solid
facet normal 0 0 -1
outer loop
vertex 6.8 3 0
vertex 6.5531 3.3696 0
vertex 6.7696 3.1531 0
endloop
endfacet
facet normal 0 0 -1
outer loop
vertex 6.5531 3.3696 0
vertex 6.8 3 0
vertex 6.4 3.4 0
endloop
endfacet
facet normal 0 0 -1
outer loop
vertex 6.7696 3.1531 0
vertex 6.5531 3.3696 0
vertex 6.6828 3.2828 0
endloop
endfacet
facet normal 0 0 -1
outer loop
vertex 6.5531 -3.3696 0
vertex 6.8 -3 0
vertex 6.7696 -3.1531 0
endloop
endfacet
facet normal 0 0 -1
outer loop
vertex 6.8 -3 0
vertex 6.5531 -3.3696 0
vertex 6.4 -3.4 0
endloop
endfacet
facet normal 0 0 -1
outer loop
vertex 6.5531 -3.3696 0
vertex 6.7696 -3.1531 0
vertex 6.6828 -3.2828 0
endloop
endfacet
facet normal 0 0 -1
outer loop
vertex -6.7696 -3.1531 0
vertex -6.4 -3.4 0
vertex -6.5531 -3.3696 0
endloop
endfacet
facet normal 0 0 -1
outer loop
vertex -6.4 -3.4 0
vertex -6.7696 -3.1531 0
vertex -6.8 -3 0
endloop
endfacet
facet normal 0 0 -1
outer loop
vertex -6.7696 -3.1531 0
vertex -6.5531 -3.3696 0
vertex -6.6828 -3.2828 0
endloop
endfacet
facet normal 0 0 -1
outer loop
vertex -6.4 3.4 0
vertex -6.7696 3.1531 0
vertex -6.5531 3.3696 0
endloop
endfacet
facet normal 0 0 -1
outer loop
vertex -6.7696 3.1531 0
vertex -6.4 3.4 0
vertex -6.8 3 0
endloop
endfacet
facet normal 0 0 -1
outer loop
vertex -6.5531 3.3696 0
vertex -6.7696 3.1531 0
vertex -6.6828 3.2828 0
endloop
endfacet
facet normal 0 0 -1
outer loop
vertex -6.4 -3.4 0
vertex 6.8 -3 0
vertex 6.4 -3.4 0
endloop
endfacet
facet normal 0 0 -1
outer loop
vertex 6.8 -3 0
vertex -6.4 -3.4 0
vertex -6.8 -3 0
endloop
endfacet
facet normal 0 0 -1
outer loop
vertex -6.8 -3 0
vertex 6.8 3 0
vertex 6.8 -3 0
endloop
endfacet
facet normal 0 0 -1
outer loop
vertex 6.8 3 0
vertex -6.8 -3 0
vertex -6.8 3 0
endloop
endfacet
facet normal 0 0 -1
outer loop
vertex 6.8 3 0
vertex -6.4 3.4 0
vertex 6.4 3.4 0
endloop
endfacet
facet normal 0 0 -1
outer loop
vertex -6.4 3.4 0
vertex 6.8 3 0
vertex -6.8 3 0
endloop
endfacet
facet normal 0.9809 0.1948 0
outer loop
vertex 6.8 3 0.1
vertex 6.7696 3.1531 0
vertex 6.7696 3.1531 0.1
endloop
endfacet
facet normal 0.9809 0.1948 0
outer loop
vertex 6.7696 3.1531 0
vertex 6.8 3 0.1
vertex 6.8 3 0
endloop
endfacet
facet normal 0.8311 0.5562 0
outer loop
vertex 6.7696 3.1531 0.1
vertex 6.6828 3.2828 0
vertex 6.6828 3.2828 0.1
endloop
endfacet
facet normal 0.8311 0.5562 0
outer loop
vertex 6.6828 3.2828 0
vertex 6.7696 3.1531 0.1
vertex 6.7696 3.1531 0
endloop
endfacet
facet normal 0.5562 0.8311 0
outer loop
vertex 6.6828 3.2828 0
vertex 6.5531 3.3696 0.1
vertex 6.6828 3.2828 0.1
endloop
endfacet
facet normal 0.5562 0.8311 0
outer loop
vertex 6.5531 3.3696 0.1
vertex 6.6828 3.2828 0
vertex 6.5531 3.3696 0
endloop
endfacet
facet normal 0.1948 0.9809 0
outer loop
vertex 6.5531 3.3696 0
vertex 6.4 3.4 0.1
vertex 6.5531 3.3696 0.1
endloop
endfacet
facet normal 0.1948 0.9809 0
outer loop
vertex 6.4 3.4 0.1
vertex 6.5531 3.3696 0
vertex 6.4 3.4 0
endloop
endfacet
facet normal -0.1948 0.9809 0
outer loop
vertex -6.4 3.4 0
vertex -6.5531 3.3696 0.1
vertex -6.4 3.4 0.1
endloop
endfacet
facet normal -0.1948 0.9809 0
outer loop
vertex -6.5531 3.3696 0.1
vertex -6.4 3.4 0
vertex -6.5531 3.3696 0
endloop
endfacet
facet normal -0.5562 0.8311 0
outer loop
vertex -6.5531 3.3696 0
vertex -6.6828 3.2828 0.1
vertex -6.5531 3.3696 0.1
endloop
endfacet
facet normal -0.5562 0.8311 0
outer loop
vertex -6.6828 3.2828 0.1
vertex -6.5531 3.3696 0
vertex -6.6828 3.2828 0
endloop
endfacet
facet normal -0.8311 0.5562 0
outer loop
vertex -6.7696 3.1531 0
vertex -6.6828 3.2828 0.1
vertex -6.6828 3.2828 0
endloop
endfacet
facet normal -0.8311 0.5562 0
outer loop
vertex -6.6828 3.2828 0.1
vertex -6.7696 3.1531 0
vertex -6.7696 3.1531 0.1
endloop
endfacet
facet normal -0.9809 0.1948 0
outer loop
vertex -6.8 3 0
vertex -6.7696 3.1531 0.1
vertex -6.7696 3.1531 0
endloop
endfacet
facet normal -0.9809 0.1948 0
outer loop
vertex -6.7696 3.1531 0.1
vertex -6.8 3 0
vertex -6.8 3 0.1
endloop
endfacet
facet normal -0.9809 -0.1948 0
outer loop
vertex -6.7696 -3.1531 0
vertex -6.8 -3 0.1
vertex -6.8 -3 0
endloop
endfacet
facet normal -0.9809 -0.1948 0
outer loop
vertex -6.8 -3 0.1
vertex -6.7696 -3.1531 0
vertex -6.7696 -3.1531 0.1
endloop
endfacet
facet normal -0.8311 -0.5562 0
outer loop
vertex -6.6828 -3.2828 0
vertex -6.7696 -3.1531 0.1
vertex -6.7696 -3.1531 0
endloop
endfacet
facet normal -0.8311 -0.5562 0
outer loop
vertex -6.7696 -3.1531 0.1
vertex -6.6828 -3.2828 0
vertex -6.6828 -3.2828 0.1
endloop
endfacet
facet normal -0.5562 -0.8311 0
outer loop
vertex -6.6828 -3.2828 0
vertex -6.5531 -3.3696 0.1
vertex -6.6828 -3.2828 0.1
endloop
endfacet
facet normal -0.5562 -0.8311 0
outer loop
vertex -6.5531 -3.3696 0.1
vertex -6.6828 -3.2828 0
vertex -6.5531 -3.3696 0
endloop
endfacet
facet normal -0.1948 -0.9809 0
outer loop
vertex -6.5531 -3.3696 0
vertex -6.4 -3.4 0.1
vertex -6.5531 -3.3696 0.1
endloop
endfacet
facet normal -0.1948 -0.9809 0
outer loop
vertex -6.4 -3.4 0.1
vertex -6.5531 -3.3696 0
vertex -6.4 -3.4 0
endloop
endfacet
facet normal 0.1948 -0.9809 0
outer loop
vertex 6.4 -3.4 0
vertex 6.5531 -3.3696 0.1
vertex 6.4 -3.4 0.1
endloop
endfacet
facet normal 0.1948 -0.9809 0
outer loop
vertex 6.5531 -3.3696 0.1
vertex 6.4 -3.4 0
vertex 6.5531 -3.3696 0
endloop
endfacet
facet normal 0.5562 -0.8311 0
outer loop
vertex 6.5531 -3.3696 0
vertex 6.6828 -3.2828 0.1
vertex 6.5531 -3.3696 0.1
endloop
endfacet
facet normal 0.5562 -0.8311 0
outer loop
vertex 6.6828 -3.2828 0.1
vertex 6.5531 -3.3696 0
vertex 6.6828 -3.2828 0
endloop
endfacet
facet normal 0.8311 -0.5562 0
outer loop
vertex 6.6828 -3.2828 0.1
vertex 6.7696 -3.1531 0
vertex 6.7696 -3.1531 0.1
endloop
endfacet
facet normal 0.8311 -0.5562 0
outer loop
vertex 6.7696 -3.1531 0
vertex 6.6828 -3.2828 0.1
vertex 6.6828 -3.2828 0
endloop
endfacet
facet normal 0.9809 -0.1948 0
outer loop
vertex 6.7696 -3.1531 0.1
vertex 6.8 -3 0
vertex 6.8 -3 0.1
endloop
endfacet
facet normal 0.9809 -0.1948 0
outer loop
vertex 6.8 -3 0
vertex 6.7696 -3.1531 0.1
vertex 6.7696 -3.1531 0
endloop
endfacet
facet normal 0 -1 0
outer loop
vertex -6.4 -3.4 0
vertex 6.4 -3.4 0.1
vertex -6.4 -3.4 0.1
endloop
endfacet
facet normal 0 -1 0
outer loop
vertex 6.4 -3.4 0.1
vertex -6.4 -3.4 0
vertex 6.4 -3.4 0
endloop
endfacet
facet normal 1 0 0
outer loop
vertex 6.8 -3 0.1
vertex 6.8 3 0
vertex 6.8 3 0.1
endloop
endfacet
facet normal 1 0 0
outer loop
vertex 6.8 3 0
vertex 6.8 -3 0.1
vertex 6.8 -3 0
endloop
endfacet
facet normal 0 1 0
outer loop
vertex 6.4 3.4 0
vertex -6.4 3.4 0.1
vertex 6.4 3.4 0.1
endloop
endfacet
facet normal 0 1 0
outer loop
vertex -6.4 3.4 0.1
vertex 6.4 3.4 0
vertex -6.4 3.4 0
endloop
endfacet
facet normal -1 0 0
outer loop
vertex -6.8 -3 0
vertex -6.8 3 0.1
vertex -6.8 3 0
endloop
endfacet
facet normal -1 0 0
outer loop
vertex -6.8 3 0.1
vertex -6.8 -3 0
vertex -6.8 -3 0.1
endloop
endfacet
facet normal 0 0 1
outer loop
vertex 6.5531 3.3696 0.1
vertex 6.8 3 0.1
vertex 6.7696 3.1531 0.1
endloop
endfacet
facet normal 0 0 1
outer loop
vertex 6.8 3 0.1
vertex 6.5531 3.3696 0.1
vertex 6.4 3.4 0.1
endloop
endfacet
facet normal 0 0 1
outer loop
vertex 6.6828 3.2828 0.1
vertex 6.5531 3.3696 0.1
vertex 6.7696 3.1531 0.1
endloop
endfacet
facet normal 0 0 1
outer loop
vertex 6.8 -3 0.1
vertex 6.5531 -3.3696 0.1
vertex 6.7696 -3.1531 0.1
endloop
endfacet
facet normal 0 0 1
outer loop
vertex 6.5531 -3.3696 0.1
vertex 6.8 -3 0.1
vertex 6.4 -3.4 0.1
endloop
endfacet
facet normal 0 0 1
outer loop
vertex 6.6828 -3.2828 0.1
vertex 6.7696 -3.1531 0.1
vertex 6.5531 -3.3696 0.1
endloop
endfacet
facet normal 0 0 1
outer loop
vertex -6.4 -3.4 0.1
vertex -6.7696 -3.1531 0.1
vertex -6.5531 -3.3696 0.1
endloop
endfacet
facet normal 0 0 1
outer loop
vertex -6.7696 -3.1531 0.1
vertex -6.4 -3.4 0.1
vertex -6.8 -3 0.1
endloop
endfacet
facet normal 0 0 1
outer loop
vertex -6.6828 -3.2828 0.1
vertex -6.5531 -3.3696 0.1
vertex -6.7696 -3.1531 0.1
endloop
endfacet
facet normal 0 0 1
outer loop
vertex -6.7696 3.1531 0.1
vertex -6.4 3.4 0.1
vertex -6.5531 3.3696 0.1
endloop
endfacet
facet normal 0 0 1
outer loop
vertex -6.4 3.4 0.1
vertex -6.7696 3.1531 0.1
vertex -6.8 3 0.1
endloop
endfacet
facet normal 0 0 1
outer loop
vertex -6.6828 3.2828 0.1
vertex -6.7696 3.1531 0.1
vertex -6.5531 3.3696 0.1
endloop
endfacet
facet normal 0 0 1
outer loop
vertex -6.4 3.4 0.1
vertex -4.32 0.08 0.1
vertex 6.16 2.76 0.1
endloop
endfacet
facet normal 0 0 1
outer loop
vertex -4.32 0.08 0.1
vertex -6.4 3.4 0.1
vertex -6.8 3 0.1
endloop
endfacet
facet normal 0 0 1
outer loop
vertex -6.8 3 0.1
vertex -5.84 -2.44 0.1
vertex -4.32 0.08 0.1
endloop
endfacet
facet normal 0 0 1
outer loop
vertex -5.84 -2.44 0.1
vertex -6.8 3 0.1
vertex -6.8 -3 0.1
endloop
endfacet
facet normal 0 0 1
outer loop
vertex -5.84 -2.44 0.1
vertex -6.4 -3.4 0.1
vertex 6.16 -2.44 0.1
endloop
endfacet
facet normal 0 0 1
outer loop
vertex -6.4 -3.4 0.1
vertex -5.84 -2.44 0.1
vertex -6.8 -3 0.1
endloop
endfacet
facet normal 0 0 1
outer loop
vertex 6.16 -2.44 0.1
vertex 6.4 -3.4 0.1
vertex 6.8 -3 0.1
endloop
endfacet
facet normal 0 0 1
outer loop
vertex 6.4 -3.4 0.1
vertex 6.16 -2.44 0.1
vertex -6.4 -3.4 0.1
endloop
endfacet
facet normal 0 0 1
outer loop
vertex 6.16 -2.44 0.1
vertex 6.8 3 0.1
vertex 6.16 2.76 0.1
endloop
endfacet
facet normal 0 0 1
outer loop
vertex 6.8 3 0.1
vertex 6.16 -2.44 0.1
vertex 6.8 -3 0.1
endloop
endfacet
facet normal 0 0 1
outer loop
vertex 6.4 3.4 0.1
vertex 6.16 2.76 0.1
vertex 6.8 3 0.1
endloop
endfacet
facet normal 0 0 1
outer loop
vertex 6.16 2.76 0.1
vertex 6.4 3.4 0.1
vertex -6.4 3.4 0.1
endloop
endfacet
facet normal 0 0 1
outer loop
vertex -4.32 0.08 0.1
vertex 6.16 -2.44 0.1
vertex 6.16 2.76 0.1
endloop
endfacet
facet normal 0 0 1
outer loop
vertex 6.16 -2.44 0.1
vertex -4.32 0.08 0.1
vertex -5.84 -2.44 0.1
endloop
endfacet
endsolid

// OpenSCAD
// file: ../p/1-4cyli.scad
use <../lib.scad>
function ldraw_lib__1_4cyli() = [
// 0 Cylinder 0.25
// 0 Name: 1-4cyli.dat
// 0 Author: James Jessiman
// 0 !LDRAW_ORG Primitive UPDATE 2012-01
// 0 !LICENSE Licensed under CC BY 4.0 : see CAreadme.txt
// 
// 0 BFC CERTIFY CCW
  [0,"BFC","CERTIFY"],
  [0,"BFC","CCW"],
// 
// 0 !HISTORY 2002-03-23 [sbliss] Added BFC statement.
// 0 !HISTORY 2002-04-25 [PTadmin] Official Update 2002-02
// 0 !HISTORY 2007-06-22 [PTadmin] Header formatted for Contributor Agreement
// 0 !HISTORY 2008-07-01 [PTadmin] Official Update 2008-01
// 0 !HISTORY 2012-02-16 [Philo] Changed to CCW
// 0 !HISTORY 2012-03-30 [PTadmin] Official Update 2012-01
// 
// 
// 4 16 1 1 0 0.9239 1 0.3827 0.9239 0 0.3827 1 0 0
  [4,16,1,1,0,0.9239,1,0.3827,0.9239,0,0.3827,1,0,0],
// 5 24 1 0 0 1 1 0 0.9239 0 0.3827 1 0 -1
  [5,24,1,0,0,1,1,0,0.9239,0,0.3827,1,0,-1],
// 4 16 0.9239 1 0.3827 0.7071 1 0.7071 0.7071 0 0.7071 0.9239 0 0.3827
  [4,16,0.9239,1,0.3827,0.7071,1,0.7071,0.7071,0,0.7071,0.9239,0,0.3827],
// 5 24 0.9239 0 0.3827 0.9239 1 0.3827 0.7071 0 0.7071 1 0 0
  [5,24,0.9239,0,0.3827,0.9239,1,0.3827,0.7071,0,0.7071,1,0,0],
// 4 16 0.7071 1 0.7071 0.3827 1 0.9239 0.3827 0 0.9239 0.7071 0 0.7071
  [4,16,0.7071,1,0.7071,0.3827,1,0.9239,0.3827,0,0.9239,0.7071,0,0.7071],
// 5 24 0.7071 0 0.7071 0.7071 1 0.7071 0.3827 0 0.9239 0.9239 0 0.3827
  [5,24,0.7071,0,0.7071,0.7071,1,0.7071,0.3827,0,0.9239,0.9239,0,0.3827],
// 4 16 0.3827 1 0.9239 0 1 1 0 0 1 0.3827 0 0.9239
  [4,16,0.3827,1,0.9239,0,1,1,0,0,1,0.3827,0,0.9239],
// 5 24 0.3827 0 0.9239 0.3827 1 0.9239 0 0 1 0.7071 0 0.7071
  [5,24,0.3827,0,0.9239,0.3827,1,0.9239,0,0,1,0.7071,0,0.7071],
// 5 24 0 0 1 0 1 1 0.3827 0 0.9239 -1 0 1
  [5,24,0,0,1,0,1,1,0.3827,0,0.9239,-1,0,1],
];
module ldraw_lib__1_4cyli(step=0, col=false, unit=2/5, alt=false, line=0.2, solid=!$preview)
    makepoly(ldraw_lib__1_4cyli(), step=step, col=col, unit=unit, alt=alt, line=line, solid=solid);
ldraw_lib__1_4cyli(line=0.2);
// file: ../p/1-4chrd.scad
use <../lib.scad>
function ldraw_lib__1_4chrd() = [
// 0 Chord 0.25
// 0 Name: 1-4chrd.dat
// 0 Author: Max Martin Richter [MMR1988]
// 0 !LDRAW_ORG Primitive UPDATE 2023-05
// 0 !LICENSE Licensed under CC BY 4.0 : see CAreadme.txt
// 
// 0 BFC CERTIFY CCW
  [0,"BFC","CERTIFY"],
  [0,"BFC","CCW"],
// 
// 0 !HISTORY 2004-04-22 [PTadmin] Official Update 2004-02
// 0 !HISTORY 2007-10-09 [PTadmin] Header formatted for Contributor Agreement
// 0 !HISTORY 2008-07-01 [PTadmin] Official Update 2008-01
// 0 !HISTORY 2012-08-02 [MMR1988] Re-creation with PrimGen2 and Rectifier
// 0 !HISTORY 2012-08-09 [PTadmin] Official Update 2012-02
// 0 !HISTORY 2023-10-27 [OrionP] Change author to MMR1988 from hafhead
// 0 !HISTORY 2023-10-31 [OrionP] Official Update 2023-05
// 
// 4 16 0.9239 0 0.3827 0.3827 0 0.9239 0 0 1 1 0 0
  [4,16,0.9239,0,0.3827,0.3827,0,0.9239,0,0,1,1,0,0],
// 3 16 0.7071 0 0.7071 0.3827 0 0.9239 0.9239 0 0.3827
  [3,16,0.7071,0,0.7071,0.3827,0,0.9239,0.9239,0,0.3827],
];
module ldraw_lib__1_4chrd(step=0, col=false, unit=2/5, alt=false, line=0.2, solid=!$preview)
    makepoly(ldraw_lib__1_4chrd(), step=step, col=col, unit=unit, alt=alt, line=line, solid=solid);
ldraw_lib__1_4chrd(line=0.2);
// main file
use <../lib.scad>
use <../p/1-4chrd.scad>
use <../p/1-4cyli.scad>
function ldraw_lib__6347356i() = [
// 0 Sticker  0.8 x  1.7 with Bright Light Orange Trapezoid Long Left
// 0 Name: 6347356i.dat
// 0 Author: Evert-Jan Boer [ejboer]
// 0 !LDRAW_ORG Part UPDATE 2024-06
// 0 !LICENSE Licensed under CC BY 4.0 : see CAreadme.txt
// 
// 0 BFC CERTIFY CCW
  [0,"BFC","CERTIFY"],
  [0,"BFC","CCW"],
// 
// 0 !KEYWORDS Republic Gunship, Set 75309, Star Wars
// 
// 0 !HISTORY 2024-07-29 [OrionP] Official Update 2024-06
// 
// 1 16 16 0 7.5 1 0 0 0 -1 0 0 0 1 1-4chrd.dat
  [1,16,16,0,7.5,1,0,0,0,-1,0,0,0,1, ldraw_lib__1_4chrd()],
// 1 16 16 0 -7.5 0 0 1 0 -1 0 -1 0 0 1-4chrd.dat
  [1,16,16,0,-7.5,0,0,1,0,-1,0,-1,0,0, ldraw_lib__1_4chrd()],
// 1 16 -16 0 -7.5 -1 0 0 0 -1 0 0 0 -1 1-4chrd.dat
  [1,16,-16,0,-7.5,-1,0,0,0,-1,0,0,0,-1, ldraw_lib__1_4chrd()],
// 1 16 -16 0 7.5 0 0 -1 0 -1 0 1 0 0 1-4chrd.dat
  [1,16,-16,0,7.5,0,0,-1,0,-1,0,1,0,0, ldraw_lib__1_4chrd()],
// 4 16 16 0 -8.5 -16 0 -8.5 -17 0 -7.5 17 0 -7.5
  [4,16,16,0,-8.5,-16,0,-8.5,-17,0,-7.5,17,0,-7.5],
// 4 16 17 0 7.5 17 0 -7.5 -17 0 -7.5 -17 0 7.5
  [4,16,17,0,7.5,17,0,-7.5,-17,0,-7.5,-17,0,7.5],
// 4 16 17 0 7.5 -17 0 7.5 -16 0 8.5 16 0 8.5
  [4,16,17,0,7.5,-17,0,7.5,-16,0,8.5,16,0,8.5],
// 
// 1 16 16 -.25 7.5 1 0 0 0 .25 0 0 0 1 1-4cyli.dat
  [1,16,16,-.25,7.5,1,0,0,0,.25,0,0,0,1, ldraw_lib__1_4cyli()],
// 1 16 -16 -.25 7.5 0 0 -1 0 .25 0 1 0 0 1-4cyli.dat
  [1,16,-16,-.25,7.5,0,0,-1,0,.25,0,1,0,0, ldraw_lib__1_4cyli()],
// 1 16 -16 -.25 -7.5 -1 0 0 0 .25 0 0 0 -1 1-4cyli.dat
  [1,16,-16,-.25,-7.5,-1,0,0,0,.25,0,0,0,-1, ldraw_lib__1_4cyli()],
// 1 16 16 -.25 -7.5 0 0 1 0 .25 0 -1 0 0 1-4cyli.dat
  [1,16,16,-.25,-7.5,0,0,1,0,.25,0,-1,0,0, ldraw_lib__1_4cyli()],
// 4 16 16 -.25 -8.5 -16 -.25 -8.5 -16 0 -8.5 16 0 -8.5
  [4,16,16,-.25,-8.5,-16,-.25,-8.5,-16,0,-8.5,16,0,-8.5],
// 4 16 17 -.25 7.5 17 -.25 -7.5 17 0 -7.5 17 0 7.5
  [4,16,17,-.25,7.5,17,-.25,-7.5,17,0,-7.5,17,0,7.5],
// 4 16 -16 -.25 8.5 16 -.25 8.5 16 0 8.5 -16 0 8.5
  [4,16,-16,-.25,8.5,16,-.25,8.5,16,0,8.5,-16,0,8.5],
// 4 16 -17 -.25 -7.5 -17 -.25 7.5 -17 0 7.5 -17 0 -7.5
  [4,16,-17,-.25,-7.5,-17,-.25,7.5,-17,0,7.5,-17,0,-7.5],
// 
// 1 16 16 -.25 7.5 1 0 0 0 1 0 0 0 1 1-4chrd.dat
  [1,16,16,-.25,7.5,1,0,0,0,1,0,0,0,1, ldraw_lib__1_4chrd()],
// 1 16 16 -.25 -7.5 0 0 1 0 1 0 -1 0 0 1-4chrd.dat
  [1,16,16,-.25,-7.5,0,0,1,0,1,0,-1,0,0, ldraw_lib__1_4chrd()],
// 1 16 -16 -.25 -7.5 -1 0 0 0 1 0 0 0 -1 1-4chrd.dat
  [1,16,-16,-.25,-7.5,-1,0,0,0,1,0,0,0,-1, ldraw_lib__1_4chrd()],
// 1 16 -16 -.25 7.5 0 0 -1 0 1 0 1 0 0 1-4chrd.dat
  [1,16,-16,-.25,7.5,0,0,-1,0,1,0,1,0,0, ldraw_lib__1_4chrd()],
// 4 16 15.4 -.25 6.9 -16 -.25 8.5 -17 -.25 7.5 -10.8 -.25 .2
  [4,16,15.4,-.25,6.9,-16,-.25,8.5,-17,-.25,7.5,-10.8,-.25,.2],
// 4 16 -17 -.25 -7.5 -14.6 -.25 -6.1 -10.8 -.25 .2 -17 -.25 7.5
  [4,16,-17,-.25,-7.5,-14.6,-.25,-6.1,-10.8,-.25,.2,-17,-.25,7.5],
// 4 16 -17 -.25 -7.5 -16 -.25 -8.5 15.4 -.25 -6.1 -14.6 -.25 -6.1
  [4,16,-17,-.25,-7.5,-16,-.25,-8.5,15.4,-.25,-6.1,-14.6,-.25,-6.1],
// 4 16 17 -.25 -7.5 15.4 -.25 -6.1 -16 -.25 -8.5 16 -.25 -8.5
  [4,16,17,-.25,-7.5,15.4,-.25,-6.1,-16,-.25,-8.5,16,-.25,-8.5],
// 4 16 15.4 -.25 -6.1 17 -.25 -7.5 17 -.25 7.5 15.4 -.25 6.9
  [4,16,15.4,-.25,-6.1,17,-.25,-7.5,17,-.25,7.5,15.4,-.25,6.9],
// 4 16 -16 -.25 8.5 15.4 -.25 6.9 17 -.25 7.5 16 -.25 8.5
  [4,16,-16,-.25,8.5,15.4,-.25,6.9,17,-.25,7.5,16,-.25,8.5],
// 
// 0 BFC NOCLIP
  [0,"BFC","NOCLIP"],
// 4 191 -14.6 -.25 -6.1 15.4 -.25 -6.1 15.4 -.25 6.9 -10.8 -.25 .2
  [4,191,-14.6,-.25,-6.1,15.4,-.25,-6.1,15.4,-.25,6.9,-10.8,-.25,.2],
];
module ldraw_lib__6347356i(step=0, col=false, unit=2/5, alt=false, line=0.2, solid=!$preview)
    makepoly(ldraw_lib__6347356i(), step=step, col=col, unit=unit, alt=alt, line=line, solid=solid);
ldraw_lib__6347356i(line=0.2);
